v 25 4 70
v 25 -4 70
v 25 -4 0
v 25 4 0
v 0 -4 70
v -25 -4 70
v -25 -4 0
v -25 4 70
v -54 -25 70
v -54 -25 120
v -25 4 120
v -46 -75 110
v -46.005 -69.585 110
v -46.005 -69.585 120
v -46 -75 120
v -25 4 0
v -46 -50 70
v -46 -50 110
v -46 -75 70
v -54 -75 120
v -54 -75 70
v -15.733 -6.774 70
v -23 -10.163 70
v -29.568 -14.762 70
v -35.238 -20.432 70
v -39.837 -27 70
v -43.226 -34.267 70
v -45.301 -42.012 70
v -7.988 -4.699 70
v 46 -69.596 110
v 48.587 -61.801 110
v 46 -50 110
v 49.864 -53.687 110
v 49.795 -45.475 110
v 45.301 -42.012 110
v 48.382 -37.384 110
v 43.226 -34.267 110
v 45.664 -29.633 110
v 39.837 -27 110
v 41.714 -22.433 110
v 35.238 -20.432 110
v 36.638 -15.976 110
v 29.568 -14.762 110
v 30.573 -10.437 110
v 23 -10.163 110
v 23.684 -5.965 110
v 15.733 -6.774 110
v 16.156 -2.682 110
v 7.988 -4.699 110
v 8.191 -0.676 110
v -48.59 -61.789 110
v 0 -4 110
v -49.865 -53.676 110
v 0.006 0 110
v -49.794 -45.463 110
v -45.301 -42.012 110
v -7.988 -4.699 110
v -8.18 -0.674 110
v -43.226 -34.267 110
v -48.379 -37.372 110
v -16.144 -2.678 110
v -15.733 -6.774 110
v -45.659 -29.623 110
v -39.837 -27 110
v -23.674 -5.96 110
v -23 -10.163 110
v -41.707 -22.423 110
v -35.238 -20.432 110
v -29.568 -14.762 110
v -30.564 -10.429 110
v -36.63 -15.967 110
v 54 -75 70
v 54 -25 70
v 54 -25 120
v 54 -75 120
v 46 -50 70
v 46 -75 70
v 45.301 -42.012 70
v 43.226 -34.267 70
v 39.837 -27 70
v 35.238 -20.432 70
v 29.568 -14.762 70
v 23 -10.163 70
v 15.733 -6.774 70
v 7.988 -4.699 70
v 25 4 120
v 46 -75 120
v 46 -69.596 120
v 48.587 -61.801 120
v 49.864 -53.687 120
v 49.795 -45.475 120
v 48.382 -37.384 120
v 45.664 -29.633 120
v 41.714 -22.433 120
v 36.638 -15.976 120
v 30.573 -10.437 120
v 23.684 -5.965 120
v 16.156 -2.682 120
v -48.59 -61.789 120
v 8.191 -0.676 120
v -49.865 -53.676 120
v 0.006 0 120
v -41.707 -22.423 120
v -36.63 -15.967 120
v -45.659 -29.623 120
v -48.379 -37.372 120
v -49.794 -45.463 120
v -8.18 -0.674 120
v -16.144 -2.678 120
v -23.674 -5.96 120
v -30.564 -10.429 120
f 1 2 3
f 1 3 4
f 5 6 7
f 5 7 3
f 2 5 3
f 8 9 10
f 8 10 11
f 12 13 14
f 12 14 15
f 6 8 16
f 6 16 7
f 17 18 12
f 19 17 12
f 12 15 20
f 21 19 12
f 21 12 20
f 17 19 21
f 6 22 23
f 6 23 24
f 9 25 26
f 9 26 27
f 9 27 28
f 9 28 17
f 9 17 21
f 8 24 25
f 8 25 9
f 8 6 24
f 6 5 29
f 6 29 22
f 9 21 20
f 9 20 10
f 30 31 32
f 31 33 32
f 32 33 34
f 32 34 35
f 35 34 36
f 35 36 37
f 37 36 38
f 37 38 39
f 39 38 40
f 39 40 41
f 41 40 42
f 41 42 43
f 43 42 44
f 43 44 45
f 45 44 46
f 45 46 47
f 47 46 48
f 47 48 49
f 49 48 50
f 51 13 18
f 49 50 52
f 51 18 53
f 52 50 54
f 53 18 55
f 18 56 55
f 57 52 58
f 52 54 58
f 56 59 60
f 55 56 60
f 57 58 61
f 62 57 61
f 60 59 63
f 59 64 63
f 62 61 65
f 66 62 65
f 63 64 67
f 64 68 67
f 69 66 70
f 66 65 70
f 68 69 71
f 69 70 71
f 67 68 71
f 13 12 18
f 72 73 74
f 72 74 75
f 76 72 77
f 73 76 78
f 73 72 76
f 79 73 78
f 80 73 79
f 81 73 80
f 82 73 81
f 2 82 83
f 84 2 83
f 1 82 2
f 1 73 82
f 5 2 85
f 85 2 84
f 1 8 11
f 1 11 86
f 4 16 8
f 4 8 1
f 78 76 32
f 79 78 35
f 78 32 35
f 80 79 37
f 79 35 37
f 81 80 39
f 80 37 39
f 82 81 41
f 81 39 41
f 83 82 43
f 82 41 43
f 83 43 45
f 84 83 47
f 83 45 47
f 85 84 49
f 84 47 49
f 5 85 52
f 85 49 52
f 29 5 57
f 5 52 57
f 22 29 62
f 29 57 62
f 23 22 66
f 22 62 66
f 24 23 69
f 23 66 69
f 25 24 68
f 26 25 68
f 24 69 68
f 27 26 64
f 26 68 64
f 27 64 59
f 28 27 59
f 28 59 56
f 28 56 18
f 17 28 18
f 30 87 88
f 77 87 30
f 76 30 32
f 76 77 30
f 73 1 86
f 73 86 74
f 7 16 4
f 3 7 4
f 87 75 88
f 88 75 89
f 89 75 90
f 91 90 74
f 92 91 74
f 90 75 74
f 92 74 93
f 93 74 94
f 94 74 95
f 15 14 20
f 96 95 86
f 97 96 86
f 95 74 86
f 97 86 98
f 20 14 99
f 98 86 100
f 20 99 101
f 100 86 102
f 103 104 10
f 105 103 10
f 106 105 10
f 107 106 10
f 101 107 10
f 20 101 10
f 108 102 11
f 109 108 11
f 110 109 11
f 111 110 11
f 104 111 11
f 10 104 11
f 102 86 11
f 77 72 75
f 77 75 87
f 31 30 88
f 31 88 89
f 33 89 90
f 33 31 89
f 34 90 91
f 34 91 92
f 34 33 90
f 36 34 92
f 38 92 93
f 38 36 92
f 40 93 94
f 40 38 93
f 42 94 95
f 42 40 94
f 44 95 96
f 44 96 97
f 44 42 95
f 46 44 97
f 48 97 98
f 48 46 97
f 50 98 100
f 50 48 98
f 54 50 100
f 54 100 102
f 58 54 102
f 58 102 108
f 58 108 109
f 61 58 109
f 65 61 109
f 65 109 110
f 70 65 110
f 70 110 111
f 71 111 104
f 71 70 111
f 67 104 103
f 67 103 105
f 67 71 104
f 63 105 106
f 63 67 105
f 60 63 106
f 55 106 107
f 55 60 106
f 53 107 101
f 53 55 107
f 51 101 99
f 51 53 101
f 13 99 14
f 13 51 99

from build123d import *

# Parameters (mm, degrees)
SKETCH_1_W      = 50
SKETCH_1_H      = 8
EXTRUDE_1_DEPTH = 40
EXTRUDE_2_DEPTH = 10


with BuildPart() as part:
    # 扫描1: sweep along a path in 草图2
    with BuildLine(Plane(origin=(0, 0, 0), x_dir=(0, 0, -1), z_dir=(1, 0, 0))) as sweep_1_path:
        Line((0, 55.298323556), (-110, 55.298323556))
    # 草图1 → 扫描1 (sweep)
    with BuildSketch(Plane.XY):
        Rectangle(SKETCH_1_W, SKETCH_1_H)
    sweep(path=sweep_1_path.line)

    # 草图4 → 凸台-拉伸1 (add)
    with BuildSketch(Plane.XY.offset(110)):
        with BuildLine():
            Line((-54, -25), (-25, 4))
            Line((-25, 4), (25, 4))
            Line((25, 4), (54, -25))
            Line((54, -25), (54, -75))
            Line((54, -75), (46, -75))
            Line((46, -75), (46, -50))
            ThreePointArc((46, -50), (0, -4), (-46, -50))
            Line((-46, -50), (-46, -75))
            Line((-46, -75), (-54, -75))
            Line((-54, -75), (-54, -25))
        make_face()
    extrude(amount=-EXTRUDE_1_DEPTH)

    # 草图5 → 凸台-拉伸2 (add)
    with BuildSketch(Plane.XY.offset(110)):
        with BuildLine():
            Line((-46.0046646, -69.584964515), (-46, -75))
            Line((-46, -75), (-54, -75))
            Line((-54, -75), (-54, -25))
            Line((-54, -25), (-25, 4))
            Line((-25, 4), (25, 4))
            Line((25, 4), (54, -25))
            Line((54, -25), (54, -75))
            Line((54, -75), (46, -75))
            Line((46, -75), (46, -69.595917942))
            ThreePointArc((46, -69.595917942), (0.005952648, -3.54e-07), (-46.0046646, -69.584964515))
        make_face()
    extrude(amount=EXTRUDE_2_DEPTH)


solid = part.part
